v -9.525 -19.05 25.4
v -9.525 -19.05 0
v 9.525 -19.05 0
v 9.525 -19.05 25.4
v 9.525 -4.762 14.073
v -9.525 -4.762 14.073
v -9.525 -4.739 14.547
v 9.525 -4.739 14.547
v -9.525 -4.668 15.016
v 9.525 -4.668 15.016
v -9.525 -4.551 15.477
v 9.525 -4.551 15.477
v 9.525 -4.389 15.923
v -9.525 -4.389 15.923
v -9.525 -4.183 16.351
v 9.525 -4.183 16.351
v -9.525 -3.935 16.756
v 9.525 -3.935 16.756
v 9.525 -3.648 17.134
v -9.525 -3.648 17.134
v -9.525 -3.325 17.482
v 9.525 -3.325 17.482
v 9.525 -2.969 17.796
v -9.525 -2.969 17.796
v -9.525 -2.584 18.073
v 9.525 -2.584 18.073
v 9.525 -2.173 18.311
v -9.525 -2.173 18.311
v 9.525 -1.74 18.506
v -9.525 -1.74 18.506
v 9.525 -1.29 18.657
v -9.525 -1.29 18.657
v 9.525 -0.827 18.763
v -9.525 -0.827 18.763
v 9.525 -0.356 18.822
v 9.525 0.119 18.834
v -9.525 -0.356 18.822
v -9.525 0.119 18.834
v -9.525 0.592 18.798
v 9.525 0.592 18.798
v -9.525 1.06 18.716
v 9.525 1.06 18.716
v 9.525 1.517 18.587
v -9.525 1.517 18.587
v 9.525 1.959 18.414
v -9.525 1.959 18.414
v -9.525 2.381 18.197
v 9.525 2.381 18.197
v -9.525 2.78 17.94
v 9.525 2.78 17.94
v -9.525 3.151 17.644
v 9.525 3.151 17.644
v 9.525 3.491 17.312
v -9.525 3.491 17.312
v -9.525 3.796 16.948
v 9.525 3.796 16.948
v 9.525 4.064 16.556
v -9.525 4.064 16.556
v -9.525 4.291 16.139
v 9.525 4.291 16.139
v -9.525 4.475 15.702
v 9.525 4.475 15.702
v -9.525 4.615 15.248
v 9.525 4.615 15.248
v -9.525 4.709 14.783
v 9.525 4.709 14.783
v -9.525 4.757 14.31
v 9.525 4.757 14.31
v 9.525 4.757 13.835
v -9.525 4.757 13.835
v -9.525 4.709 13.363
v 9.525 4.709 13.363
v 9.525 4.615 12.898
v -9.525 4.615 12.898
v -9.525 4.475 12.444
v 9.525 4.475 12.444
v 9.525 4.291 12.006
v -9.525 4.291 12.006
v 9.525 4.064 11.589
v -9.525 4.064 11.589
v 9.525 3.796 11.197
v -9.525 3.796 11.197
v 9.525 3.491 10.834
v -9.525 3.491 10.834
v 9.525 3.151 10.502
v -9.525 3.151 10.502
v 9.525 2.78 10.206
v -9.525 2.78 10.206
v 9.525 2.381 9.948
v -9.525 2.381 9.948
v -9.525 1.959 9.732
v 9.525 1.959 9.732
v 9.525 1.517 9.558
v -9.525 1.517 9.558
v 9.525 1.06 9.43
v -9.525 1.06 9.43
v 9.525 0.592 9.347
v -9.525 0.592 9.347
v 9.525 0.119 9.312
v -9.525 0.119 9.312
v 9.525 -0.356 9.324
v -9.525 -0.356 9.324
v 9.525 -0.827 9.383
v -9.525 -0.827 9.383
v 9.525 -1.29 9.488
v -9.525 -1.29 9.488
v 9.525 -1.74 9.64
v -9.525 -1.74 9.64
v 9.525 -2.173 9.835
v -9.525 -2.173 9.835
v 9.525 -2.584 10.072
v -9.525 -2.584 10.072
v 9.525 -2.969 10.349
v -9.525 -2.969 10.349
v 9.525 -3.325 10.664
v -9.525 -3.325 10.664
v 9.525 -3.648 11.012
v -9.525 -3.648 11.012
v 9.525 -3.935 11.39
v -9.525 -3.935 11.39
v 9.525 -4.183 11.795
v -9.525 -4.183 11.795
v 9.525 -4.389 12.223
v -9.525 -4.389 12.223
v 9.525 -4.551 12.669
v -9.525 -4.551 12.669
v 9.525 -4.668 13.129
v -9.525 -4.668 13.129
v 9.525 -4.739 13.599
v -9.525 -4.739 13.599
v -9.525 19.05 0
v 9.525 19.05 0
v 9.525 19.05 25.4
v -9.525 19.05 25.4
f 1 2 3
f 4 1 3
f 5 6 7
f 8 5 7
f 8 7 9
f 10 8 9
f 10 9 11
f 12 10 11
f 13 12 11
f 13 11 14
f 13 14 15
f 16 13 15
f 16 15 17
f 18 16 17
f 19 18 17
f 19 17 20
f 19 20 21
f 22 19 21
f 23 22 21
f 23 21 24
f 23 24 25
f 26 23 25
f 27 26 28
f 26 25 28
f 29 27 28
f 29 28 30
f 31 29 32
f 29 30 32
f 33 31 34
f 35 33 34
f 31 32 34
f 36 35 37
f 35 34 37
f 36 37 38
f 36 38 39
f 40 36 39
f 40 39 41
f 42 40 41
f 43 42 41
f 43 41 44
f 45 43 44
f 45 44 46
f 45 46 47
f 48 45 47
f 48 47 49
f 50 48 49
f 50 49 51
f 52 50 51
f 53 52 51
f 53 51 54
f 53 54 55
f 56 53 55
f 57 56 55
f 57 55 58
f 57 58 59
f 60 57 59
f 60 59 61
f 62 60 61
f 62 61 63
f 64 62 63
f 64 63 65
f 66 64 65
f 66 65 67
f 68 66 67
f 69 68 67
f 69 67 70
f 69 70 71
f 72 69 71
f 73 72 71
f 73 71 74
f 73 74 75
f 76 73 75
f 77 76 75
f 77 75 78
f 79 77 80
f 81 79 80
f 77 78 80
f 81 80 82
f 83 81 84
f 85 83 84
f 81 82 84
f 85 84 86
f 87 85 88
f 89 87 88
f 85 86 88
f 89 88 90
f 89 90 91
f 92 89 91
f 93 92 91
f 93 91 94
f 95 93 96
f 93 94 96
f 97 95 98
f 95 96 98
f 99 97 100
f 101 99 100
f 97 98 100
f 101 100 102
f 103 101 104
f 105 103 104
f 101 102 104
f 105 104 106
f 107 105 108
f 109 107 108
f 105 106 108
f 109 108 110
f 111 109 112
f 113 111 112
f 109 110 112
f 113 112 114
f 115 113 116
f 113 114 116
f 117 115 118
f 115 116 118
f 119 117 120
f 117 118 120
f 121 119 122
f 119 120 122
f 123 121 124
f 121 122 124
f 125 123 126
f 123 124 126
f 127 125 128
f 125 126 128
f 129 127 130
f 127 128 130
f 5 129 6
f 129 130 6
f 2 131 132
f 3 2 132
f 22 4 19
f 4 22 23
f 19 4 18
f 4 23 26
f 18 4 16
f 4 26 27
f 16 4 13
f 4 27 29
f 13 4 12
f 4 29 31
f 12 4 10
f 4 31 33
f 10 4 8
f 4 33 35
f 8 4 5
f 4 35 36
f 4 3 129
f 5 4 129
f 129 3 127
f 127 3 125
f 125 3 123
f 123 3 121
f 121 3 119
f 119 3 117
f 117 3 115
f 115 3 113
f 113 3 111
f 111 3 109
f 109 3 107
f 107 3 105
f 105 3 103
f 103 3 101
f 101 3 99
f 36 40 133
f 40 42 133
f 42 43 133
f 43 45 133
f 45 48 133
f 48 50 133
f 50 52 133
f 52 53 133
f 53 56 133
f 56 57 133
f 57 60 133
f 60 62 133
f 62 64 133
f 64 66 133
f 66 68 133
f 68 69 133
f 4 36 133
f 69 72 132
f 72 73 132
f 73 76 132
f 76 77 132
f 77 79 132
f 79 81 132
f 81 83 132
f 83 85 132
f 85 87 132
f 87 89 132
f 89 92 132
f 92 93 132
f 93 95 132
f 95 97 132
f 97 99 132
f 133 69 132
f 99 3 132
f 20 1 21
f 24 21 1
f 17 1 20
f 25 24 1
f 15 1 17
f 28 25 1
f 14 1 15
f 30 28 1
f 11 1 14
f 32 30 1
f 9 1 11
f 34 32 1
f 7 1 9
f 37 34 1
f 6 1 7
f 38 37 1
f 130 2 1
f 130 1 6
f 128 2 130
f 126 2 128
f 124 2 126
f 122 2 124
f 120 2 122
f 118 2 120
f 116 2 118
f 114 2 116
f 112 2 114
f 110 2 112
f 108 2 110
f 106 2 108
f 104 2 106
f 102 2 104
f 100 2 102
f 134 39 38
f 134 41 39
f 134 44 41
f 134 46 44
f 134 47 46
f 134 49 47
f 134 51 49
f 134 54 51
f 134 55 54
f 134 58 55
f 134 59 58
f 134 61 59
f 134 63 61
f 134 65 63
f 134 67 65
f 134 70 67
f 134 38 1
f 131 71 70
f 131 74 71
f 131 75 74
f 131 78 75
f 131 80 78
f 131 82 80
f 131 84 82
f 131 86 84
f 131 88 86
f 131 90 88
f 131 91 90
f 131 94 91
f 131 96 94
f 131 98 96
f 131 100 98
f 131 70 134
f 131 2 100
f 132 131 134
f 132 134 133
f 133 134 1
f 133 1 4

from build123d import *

# Parameters (mm, degrees)
F0_W     = 19.05
F0_H     = 38.1
F1_DEPTH = 25.4
F3_D     = 9.525


with BuildPart() as f1:
    # F0 (on Top) → F1 (new body)
    with BuildSketch(Plane.XY):
        Rectangle(F0_W, F0_H)
    extrude(amount=F1_DEPTH)

    # F3 (through all)
    with Locations(Plane.YZ.offset(9.525)):
        with Locations((0, 14.072823)):
            Hole(F3_D / 2)


solid = f1.part
